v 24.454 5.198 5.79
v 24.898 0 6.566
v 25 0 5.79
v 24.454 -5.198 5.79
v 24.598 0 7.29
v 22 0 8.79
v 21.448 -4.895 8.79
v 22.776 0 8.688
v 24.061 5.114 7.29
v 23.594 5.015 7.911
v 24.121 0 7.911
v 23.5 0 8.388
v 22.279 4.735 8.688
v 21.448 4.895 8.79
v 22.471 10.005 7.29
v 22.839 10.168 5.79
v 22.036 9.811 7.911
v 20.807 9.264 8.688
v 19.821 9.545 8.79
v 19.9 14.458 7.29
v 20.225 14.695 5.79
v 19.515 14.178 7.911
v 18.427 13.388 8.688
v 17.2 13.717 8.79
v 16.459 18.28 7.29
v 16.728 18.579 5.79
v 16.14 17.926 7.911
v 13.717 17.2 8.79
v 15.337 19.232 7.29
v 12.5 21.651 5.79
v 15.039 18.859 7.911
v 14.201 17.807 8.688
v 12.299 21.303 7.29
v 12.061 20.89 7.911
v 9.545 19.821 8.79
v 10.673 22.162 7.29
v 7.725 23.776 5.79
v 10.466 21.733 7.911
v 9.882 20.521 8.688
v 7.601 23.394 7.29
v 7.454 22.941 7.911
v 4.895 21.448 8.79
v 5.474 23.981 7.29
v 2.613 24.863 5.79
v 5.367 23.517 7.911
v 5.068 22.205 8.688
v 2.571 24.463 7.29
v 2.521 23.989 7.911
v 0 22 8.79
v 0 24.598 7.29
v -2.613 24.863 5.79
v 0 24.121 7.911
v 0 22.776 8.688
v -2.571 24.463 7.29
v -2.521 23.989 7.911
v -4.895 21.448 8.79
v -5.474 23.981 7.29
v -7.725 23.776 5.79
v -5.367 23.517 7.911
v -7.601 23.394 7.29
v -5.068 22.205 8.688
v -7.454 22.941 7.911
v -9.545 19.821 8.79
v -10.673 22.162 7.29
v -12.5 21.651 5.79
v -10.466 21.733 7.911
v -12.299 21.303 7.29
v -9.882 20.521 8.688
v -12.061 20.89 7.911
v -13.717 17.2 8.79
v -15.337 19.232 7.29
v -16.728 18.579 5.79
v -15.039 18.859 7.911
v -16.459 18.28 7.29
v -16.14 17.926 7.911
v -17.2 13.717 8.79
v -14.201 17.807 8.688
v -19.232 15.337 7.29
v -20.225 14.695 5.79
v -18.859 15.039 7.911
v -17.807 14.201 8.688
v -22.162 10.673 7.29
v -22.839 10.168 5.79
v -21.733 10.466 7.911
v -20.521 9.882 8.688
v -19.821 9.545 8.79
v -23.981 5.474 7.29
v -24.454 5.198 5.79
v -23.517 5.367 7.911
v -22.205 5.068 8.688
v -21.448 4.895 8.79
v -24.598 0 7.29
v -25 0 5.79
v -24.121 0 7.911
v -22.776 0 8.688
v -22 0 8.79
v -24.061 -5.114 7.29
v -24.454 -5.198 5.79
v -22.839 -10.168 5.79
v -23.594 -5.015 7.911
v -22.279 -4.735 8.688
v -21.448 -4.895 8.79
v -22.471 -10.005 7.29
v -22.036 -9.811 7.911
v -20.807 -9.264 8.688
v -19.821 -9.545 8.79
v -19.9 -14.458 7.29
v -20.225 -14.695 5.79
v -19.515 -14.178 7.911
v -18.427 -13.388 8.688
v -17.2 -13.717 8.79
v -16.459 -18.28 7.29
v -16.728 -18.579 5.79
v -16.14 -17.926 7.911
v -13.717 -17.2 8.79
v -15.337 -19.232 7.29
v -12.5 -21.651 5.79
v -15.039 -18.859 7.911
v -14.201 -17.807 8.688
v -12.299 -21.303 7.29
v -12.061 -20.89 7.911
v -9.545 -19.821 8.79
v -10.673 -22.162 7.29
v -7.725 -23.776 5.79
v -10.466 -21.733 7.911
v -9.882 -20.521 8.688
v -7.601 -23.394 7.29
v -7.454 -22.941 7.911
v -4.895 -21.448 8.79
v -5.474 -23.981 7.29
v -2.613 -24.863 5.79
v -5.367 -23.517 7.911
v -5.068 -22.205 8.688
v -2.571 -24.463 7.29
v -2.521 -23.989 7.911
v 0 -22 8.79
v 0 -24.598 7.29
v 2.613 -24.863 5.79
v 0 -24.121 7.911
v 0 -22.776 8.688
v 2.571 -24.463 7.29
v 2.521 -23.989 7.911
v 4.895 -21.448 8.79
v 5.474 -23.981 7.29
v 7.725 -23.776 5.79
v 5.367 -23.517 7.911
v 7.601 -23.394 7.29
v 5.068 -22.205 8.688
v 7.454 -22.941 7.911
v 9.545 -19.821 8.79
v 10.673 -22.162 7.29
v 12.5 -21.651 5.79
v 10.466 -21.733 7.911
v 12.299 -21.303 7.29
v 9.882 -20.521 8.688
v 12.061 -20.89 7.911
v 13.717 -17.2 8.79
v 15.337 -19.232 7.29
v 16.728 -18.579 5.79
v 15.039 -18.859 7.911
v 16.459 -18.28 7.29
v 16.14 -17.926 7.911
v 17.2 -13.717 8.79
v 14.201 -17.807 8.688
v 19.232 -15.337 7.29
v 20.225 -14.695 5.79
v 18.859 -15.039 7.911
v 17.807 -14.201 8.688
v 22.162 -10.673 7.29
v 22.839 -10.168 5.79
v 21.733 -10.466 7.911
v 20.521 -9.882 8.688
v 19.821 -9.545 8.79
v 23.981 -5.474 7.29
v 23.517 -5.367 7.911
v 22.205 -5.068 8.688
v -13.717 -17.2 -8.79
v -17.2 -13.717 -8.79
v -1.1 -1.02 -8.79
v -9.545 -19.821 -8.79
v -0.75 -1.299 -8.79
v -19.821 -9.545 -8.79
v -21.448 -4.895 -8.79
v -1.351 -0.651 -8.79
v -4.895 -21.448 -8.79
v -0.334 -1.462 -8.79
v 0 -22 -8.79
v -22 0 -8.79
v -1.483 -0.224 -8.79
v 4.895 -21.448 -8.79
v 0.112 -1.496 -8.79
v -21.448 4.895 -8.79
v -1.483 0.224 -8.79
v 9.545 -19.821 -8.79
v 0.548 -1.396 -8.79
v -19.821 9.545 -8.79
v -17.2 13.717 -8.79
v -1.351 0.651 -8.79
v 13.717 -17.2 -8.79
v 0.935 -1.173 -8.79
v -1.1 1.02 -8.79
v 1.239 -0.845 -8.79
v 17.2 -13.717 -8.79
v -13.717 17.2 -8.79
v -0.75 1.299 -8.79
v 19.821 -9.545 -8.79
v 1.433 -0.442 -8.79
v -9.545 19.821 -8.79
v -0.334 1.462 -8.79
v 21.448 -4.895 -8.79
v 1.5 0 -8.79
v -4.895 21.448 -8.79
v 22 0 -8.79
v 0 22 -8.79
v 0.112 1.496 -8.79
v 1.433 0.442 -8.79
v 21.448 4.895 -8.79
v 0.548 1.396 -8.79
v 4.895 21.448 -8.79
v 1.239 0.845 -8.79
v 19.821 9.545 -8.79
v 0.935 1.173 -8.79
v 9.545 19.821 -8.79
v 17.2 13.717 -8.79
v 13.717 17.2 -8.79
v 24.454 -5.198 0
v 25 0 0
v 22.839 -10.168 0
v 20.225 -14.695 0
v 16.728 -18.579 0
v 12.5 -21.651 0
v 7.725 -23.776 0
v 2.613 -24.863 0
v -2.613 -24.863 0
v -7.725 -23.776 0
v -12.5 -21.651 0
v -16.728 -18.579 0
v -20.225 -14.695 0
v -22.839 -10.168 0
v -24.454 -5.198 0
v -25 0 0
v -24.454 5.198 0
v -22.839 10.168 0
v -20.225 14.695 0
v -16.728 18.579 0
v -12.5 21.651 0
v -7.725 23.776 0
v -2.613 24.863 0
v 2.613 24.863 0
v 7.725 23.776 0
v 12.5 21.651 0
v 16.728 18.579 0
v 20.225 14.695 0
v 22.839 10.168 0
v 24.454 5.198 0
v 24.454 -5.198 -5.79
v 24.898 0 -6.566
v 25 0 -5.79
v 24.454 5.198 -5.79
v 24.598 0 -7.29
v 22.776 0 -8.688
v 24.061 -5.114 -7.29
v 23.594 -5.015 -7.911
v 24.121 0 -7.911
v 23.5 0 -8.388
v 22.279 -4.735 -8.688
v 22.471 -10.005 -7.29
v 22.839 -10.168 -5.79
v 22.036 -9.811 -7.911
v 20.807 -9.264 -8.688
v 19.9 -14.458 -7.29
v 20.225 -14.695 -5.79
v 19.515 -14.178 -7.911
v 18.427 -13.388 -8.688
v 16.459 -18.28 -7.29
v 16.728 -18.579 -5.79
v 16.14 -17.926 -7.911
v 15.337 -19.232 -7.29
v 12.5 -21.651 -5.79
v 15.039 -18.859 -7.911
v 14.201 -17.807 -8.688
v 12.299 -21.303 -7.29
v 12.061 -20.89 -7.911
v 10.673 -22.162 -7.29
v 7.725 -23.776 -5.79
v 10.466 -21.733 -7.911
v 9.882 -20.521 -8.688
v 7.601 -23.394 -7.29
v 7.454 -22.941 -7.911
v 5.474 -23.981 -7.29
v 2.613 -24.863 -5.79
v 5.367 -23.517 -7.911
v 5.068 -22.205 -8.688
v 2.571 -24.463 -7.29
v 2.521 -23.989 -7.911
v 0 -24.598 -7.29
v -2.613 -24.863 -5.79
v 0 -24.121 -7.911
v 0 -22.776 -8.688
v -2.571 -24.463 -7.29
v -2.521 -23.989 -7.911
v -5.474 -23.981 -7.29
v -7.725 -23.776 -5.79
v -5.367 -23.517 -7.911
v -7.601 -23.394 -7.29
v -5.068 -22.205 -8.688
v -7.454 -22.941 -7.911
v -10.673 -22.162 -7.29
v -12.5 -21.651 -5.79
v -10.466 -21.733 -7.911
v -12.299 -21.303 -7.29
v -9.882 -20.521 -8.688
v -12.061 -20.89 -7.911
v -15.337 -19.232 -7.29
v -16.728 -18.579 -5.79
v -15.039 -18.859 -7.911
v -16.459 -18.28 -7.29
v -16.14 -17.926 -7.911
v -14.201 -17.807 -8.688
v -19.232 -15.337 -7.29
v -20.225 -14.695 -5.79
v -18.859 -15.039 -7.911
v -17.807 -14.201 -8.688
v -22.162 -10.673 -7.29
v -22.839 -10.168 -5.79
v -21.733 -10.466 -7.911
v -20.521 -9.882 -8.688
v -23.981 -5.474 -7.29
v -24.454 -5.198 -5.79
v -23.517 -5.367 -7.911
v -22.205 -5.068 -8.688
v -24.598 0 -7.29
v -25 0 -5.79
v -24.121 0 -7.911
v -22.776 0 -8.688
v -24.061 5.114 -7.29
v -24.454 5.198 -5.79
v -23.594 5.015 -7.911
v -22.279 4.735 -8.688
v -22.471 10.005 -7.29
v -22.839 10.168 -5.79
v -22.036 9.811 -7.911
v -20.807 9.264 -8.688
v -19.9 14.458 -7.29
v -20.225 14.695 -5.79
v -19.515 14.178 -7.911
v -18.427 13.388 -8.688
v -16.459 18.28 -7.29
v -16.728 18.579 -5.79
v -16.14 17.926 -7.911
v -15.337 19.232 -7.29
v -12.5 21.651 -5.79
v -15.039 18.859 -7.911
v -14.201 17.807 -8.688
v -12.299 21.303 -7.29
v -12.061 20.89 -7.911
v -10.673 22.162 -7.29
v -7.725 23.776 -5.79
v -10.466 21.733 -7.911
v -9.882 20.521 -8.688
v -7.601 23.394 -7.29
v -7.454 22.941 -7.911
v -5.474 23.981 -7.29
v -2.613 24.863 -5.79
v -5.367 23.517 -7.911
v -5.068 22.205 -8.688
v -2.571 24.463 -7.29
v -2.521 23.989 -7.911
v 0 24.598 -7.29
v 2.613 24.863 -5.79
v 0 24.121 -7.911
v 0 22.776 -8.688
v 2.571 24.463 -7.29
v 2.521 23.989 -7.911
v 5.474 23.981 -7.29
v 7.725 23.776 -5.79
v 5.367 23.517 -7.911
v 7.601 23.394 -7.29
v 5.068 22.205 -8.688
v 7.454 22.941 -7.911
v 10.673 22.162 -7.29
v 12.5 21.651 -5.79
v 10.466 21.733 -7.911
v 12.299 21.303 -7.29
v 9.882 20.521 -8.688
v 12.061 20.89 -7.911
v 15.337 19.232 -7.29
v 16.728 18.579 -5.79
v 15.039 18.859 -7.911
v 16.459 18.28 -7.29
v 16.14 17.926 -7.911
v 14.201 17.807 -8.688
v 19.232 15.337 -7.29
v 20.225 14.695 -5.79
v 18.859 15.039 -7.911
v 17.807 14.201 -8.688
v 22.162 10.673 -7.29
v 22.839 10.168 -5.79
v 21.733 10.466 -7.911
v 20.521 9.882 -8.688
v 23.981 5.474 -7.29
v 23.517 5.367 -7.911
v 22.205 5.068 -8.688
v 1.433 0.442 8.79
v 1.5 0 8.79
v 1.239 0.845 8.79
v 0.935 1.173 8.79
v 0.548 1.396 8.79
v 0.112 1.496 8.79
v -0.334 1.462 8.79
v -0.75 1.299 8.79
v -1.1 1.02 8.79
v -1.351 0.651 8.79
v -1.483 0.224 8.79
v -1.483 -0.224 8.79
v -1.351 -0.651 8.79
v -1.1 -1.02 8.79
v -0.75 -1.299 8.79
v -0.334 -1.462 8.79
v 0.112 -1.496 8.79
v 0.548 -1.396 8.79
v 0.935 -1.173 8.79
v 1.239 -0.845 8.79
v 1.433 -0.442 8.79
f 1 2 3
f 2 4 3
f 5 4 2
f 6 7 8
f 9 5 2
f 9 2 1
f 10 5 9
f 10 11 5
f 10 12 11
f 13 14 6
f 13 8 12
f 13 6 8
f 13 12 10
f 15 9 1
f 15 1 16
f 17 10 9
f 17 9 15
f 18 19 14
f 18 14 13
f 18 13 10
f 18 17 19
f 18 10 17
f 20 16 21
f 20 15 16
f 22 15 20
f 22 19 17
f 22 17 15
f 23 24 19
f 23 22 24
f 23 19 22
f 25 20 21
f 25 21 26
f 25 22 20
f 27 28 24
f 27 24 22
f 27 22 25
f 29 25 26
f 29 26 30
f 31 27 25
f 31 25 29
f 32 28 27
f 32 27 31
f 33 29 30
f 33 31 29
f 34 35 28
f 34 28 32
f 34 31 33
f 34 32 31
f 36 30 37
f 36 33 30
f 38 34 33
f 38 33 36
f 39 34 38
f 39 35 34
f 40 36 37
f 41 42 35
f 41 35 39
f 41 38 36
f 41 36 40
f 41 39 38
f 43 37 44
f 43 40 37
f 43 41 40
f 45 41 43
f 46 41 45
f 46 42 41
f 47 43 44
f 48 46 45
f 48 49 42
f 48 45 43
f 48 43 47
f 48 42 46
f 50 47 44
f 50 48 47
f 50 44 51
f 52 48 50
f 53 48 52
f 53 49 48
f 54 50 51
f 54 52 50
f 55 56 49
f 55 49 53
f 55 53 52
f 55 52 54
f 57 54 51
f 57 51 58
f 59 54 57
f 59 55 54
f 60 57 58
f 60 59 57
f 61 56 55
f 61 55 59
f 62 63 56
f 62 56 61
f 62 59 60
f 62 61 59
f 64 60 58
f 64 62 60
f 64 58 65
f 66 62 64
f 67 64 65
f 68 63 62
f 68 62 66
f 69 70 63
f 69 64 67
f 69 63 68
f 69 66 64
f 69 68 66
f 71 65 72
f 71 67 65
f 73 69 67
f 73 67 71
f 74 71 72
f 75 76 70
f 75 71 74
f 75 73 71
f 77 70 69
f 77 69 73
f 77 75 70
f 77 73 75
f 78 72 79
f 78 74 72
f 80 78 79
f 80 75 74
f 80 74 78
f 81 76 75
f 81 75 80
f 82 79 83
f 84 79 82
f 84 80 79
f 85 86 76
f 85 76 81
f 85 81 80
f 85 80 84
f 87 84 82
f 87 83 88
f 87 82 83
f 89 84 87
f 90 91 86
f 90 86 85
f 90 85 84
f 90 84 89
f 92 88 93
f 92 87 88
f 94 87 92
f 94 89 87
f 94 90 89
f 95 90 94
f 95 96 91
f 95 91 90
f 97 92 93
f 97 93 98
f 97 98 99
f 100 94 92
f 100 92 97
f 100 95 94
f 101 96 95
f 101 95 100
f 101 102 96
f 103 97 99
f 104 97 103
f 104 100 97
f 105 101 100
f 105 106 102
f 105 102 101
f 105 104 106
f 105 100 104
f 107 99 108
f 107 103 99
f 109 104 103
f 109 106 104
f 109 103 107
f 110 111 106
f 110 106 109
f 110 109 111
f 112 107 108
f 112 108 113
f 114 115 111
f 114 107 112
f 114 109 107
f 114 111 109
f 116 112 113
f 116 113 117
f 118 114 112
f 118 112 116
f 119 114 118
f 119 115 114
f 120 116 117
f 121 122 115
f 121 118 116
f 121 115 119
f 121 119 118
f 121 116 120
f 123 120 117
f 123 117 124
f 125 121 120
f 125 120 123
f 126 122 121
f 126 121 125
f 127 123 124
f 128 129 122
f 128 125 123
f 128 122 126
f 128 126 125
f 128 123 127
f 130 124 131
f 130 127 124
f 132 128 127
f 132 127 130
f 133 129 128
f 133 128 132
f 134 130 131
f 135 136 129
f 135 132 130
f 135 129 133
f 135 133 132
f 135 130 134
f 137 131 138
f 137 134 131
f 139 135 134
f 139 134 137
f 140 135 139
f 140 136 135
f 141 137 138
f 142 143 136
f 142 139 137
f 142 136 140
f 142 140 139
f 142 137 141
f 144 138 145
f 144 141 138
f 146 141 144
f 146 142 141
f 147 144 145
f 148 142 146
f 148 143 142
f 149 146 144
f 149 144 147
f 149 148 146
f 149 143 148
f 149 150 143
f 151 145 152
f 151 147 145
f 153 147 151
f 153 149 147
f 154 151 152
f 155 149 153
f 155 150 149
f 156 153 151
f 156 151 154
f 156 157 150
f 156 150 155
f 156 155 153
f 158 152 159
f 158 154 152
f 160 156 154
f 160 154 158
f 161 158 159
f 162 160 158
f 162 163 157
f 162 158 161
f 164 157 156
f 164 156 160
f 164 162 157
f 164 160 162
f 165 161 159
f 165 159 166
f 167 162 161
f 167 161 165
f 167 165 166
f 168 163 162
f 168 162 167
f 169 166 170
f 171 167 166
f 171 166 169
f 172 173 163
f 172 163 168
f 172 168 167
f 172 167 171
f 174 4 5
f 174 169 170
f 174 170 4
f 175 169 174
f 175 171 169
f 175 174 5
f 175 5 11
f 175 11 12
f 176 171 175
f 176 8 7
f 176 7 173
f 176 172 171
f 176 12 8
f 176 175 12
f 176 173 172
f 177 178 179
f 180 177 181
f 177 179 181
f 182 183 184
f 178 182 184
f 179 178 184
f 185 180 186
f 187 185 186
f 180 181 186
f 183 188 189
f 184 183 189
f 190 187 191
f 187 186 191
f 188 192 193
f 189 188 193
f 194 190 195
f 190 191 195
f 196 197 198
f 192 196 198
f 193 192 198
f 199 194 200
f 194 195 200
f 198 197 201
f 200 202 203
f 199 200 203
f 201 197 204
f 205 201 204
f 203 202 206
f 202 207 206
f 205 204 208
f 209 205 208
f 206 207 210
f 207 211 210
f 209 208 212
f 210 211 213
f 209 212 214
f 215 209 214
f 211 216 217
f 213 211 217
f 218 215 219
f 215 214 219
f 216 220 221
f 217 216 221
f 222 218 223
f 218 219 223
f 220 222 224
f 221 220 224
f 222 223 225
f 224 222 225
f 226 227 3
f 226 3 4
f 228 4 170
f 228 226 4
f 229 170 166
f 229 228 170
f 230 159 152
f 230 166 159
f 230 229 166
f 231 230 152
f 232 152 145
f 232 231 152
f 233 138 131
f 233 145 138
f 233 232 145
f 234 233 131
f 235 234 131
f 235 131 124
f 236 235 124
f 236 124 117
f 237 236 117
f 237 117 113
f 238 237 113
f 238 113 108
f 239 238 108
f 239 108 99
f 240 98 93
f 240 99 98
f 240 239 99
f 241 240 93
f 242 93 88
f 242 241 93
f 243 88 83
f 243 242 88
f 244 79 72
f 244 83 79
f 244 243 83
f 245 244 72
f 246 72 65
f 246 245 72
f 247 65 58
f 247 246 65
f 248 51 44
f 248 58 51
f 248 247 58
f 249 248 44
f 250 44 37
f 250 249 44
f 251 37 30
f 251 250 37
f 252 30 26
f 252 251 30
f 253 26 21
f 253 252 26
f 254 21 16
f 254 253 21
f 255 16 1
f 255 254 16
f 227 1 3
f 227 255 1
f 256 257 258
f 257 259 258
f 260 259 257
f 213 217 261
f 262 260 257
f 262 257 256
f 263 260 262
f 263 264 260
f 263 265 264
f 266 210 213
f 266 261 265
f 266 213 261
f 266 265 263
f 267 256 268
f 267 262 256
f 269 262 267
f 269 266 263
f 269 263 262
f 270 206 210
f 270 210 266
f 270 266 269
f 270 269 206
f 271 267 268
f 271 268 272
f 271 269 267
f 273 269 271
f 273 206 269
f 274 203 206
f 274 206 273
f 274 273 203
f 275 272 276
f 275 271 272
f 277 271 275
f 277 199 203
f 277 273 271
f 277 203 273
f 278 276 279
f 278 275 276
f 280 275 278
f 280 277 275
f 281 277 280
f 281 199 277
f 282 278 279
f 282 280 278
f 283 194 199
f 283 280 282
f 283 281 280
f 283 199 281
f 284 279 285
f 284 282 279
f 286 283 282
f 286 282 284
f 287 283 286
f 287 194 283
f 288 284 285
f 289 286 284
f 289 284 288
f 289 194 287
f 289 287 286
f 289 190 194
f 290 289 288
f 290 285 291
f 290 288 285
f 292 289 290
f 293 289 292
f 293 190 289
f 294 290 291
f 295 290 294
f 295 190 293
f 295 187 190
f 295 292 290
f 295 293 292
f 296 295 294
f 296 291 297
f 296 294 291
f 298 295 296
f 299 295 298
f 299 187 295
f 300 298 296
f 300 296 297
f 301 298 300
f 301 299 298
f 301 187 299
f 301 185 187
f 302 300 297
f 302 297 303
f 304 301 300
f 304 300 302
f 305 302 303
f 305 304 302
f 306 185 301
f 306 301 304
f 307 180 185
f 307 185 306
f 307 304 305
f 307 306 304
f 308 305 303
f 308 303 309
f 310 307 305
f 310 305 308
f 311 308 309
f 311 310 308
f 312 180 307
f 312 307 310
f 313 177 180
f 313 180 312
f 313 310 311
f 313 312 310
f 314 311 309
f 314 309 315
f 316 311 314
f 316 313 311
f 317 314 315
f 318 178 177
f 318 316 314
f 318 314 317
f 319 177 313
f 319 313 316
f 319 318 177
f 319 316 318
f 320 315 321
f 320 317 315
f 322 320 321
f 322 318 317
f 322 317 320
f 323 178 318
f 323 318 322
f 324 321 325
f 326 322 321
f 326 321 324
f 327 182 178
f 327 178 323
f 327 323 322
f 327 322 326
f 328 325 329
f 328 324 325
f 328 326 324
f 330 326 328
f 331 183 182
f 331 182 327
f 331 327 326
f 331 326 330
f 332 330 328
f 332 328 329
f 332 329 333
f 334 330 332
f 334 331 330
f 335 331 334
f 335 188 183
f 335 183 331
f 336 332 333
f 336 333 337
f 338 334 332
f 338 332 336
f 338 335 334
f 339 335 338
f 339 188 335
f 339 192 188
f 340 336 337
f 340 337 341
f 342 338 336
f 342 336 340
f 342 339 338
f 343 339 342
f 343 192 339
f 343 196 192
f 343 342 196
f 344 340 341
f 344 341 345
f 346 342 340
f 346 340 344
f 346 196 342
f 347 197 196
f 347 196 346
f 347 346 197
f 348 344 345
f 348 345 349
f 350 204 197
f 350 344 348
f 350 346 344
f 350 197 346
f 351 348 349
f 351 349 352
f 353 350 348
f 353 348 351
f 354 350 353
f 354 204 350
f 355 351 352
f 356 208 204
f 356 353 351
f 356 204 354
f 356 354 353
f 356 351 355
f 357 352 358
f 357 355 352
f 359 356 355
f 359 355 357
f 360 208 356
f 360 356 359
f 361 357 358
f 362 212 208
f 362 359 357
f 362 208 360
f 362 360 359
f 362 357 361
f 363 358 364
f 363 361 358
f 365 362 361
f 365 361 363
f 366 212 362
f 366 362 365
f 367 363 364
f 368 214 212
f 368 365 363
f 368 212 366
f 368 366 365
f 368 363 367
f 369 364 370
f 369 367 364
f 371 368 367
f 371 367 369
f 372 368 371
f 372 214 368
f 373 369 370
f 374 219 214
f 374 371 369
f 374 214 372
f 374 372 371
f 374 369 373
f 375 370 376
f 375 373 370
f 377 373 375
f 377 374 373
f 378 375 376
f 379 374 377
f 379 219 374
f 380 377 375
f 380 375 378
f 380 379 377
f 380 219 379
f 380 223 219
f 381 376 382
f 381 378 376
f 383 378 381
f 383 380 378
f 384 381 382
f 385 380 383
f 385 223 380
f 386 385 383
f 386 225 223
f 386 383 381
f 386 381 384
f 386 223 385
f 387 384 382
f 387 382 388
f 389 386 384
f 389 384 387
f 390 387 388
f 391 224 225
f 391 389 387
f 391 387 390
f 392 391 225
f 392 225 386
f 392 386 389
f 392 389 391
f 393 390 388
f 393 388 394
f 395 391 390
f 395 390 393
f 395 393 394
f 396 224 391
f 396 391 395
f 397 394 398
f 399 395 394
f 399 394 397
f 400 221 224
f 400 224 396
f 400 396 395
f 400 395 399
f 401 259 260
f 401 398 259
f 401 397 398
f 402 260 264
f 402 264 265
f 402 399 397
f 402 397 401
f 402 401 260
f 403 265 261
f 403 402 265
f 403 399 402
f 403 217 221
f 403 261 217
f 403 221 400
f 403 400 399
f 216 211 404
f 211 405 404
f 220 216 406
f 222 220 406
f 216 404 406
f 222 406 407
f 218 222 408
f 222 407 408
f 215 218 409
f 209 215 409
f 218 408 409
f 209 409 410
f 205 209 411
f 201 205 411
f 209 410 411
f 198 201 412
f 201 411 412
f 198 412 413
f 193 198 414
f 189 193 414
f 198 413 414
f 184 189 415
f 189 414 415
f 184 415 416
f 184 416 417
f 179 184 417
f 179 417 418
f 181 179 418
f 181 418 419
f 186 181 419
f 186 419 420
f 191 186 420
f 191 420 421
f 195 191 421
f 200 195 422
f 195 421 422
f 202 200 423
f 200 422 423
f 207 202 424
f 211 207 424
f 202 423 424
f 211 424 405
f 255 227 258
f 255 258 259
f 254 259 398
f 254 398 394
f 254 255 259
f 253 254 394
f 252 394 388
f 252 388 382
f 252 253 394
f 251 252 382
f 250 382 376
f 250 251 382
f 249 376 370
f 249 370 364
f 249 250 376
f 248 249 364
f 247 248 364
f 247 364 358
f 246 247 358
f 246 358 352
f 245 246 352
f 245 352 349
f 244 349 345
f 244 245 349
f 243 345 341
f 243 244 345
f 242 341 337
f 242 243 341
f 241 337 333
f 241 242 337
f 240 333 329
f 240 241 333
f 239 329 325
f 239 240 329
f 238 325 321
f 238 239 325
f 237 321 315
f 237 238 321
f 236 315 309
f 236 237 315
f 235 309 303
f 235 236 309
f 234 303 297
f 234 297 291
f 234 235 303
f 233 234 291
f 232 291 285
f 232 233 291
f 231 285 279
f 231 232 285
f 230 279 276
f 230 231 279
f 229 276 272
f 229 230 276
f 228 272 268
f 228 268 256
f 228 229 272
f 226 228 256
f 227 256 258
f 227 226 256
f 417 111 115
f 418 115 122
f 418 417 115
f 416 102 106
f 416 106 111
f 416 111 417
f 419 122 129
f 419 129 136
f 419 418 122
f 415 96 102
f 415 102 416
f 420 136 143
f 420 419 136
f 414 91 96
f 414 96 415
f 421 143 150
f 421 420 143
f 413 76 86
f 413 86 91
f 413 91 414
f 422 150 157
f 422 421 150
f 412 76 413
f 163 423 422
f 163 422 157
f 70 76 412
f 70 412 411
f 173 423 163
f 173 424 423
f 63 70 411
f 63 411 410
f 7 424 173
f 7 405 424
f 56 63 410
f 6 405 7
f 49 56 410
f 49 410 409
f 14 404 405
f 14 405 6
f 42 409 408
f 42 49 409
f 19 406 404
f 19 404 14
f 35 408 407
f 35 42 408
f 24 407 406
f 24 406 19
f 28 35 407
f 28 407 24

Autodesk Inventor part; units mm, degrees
ref_plane "YZ Plane" through (0, 0, 0) normal (1, 0, 0) x (0, 1, 0)
ref_plane "XZ Plane" through (0, 0, 0) normal (0, 1, 0) x (-1, 0, 0)
ref_plane "XY Plane" through (0, 0, 0) normal (0, 0, 1) x (1, 0, 0)
sketch "Sketch1" plane through (0, 0, 0) normal (0, 0, 1) x (1, 0, 0)
  circle A0 centre (0, 0) radius 25
  dimension "d6" = 50
extrude "Extrusion1" add sketch "Sketch1" along normal mid plane 17.58
fillet "Fillet1" radius 3 2 edges at (-25, 0, 8.79) (-25, 0, -8.79)
sketch "Sketch2" plane through (0, 0, 8.79) normal (0, 0, 1) x (1, 0, 0)
  circle A0 centre (0, 0) radius 1.5
  dimension "d10" = 3
extrude "Extrusion2" cut sketch "Sketch2" along normal through all both and the other way through all
properties part number "B-50mWheel"
